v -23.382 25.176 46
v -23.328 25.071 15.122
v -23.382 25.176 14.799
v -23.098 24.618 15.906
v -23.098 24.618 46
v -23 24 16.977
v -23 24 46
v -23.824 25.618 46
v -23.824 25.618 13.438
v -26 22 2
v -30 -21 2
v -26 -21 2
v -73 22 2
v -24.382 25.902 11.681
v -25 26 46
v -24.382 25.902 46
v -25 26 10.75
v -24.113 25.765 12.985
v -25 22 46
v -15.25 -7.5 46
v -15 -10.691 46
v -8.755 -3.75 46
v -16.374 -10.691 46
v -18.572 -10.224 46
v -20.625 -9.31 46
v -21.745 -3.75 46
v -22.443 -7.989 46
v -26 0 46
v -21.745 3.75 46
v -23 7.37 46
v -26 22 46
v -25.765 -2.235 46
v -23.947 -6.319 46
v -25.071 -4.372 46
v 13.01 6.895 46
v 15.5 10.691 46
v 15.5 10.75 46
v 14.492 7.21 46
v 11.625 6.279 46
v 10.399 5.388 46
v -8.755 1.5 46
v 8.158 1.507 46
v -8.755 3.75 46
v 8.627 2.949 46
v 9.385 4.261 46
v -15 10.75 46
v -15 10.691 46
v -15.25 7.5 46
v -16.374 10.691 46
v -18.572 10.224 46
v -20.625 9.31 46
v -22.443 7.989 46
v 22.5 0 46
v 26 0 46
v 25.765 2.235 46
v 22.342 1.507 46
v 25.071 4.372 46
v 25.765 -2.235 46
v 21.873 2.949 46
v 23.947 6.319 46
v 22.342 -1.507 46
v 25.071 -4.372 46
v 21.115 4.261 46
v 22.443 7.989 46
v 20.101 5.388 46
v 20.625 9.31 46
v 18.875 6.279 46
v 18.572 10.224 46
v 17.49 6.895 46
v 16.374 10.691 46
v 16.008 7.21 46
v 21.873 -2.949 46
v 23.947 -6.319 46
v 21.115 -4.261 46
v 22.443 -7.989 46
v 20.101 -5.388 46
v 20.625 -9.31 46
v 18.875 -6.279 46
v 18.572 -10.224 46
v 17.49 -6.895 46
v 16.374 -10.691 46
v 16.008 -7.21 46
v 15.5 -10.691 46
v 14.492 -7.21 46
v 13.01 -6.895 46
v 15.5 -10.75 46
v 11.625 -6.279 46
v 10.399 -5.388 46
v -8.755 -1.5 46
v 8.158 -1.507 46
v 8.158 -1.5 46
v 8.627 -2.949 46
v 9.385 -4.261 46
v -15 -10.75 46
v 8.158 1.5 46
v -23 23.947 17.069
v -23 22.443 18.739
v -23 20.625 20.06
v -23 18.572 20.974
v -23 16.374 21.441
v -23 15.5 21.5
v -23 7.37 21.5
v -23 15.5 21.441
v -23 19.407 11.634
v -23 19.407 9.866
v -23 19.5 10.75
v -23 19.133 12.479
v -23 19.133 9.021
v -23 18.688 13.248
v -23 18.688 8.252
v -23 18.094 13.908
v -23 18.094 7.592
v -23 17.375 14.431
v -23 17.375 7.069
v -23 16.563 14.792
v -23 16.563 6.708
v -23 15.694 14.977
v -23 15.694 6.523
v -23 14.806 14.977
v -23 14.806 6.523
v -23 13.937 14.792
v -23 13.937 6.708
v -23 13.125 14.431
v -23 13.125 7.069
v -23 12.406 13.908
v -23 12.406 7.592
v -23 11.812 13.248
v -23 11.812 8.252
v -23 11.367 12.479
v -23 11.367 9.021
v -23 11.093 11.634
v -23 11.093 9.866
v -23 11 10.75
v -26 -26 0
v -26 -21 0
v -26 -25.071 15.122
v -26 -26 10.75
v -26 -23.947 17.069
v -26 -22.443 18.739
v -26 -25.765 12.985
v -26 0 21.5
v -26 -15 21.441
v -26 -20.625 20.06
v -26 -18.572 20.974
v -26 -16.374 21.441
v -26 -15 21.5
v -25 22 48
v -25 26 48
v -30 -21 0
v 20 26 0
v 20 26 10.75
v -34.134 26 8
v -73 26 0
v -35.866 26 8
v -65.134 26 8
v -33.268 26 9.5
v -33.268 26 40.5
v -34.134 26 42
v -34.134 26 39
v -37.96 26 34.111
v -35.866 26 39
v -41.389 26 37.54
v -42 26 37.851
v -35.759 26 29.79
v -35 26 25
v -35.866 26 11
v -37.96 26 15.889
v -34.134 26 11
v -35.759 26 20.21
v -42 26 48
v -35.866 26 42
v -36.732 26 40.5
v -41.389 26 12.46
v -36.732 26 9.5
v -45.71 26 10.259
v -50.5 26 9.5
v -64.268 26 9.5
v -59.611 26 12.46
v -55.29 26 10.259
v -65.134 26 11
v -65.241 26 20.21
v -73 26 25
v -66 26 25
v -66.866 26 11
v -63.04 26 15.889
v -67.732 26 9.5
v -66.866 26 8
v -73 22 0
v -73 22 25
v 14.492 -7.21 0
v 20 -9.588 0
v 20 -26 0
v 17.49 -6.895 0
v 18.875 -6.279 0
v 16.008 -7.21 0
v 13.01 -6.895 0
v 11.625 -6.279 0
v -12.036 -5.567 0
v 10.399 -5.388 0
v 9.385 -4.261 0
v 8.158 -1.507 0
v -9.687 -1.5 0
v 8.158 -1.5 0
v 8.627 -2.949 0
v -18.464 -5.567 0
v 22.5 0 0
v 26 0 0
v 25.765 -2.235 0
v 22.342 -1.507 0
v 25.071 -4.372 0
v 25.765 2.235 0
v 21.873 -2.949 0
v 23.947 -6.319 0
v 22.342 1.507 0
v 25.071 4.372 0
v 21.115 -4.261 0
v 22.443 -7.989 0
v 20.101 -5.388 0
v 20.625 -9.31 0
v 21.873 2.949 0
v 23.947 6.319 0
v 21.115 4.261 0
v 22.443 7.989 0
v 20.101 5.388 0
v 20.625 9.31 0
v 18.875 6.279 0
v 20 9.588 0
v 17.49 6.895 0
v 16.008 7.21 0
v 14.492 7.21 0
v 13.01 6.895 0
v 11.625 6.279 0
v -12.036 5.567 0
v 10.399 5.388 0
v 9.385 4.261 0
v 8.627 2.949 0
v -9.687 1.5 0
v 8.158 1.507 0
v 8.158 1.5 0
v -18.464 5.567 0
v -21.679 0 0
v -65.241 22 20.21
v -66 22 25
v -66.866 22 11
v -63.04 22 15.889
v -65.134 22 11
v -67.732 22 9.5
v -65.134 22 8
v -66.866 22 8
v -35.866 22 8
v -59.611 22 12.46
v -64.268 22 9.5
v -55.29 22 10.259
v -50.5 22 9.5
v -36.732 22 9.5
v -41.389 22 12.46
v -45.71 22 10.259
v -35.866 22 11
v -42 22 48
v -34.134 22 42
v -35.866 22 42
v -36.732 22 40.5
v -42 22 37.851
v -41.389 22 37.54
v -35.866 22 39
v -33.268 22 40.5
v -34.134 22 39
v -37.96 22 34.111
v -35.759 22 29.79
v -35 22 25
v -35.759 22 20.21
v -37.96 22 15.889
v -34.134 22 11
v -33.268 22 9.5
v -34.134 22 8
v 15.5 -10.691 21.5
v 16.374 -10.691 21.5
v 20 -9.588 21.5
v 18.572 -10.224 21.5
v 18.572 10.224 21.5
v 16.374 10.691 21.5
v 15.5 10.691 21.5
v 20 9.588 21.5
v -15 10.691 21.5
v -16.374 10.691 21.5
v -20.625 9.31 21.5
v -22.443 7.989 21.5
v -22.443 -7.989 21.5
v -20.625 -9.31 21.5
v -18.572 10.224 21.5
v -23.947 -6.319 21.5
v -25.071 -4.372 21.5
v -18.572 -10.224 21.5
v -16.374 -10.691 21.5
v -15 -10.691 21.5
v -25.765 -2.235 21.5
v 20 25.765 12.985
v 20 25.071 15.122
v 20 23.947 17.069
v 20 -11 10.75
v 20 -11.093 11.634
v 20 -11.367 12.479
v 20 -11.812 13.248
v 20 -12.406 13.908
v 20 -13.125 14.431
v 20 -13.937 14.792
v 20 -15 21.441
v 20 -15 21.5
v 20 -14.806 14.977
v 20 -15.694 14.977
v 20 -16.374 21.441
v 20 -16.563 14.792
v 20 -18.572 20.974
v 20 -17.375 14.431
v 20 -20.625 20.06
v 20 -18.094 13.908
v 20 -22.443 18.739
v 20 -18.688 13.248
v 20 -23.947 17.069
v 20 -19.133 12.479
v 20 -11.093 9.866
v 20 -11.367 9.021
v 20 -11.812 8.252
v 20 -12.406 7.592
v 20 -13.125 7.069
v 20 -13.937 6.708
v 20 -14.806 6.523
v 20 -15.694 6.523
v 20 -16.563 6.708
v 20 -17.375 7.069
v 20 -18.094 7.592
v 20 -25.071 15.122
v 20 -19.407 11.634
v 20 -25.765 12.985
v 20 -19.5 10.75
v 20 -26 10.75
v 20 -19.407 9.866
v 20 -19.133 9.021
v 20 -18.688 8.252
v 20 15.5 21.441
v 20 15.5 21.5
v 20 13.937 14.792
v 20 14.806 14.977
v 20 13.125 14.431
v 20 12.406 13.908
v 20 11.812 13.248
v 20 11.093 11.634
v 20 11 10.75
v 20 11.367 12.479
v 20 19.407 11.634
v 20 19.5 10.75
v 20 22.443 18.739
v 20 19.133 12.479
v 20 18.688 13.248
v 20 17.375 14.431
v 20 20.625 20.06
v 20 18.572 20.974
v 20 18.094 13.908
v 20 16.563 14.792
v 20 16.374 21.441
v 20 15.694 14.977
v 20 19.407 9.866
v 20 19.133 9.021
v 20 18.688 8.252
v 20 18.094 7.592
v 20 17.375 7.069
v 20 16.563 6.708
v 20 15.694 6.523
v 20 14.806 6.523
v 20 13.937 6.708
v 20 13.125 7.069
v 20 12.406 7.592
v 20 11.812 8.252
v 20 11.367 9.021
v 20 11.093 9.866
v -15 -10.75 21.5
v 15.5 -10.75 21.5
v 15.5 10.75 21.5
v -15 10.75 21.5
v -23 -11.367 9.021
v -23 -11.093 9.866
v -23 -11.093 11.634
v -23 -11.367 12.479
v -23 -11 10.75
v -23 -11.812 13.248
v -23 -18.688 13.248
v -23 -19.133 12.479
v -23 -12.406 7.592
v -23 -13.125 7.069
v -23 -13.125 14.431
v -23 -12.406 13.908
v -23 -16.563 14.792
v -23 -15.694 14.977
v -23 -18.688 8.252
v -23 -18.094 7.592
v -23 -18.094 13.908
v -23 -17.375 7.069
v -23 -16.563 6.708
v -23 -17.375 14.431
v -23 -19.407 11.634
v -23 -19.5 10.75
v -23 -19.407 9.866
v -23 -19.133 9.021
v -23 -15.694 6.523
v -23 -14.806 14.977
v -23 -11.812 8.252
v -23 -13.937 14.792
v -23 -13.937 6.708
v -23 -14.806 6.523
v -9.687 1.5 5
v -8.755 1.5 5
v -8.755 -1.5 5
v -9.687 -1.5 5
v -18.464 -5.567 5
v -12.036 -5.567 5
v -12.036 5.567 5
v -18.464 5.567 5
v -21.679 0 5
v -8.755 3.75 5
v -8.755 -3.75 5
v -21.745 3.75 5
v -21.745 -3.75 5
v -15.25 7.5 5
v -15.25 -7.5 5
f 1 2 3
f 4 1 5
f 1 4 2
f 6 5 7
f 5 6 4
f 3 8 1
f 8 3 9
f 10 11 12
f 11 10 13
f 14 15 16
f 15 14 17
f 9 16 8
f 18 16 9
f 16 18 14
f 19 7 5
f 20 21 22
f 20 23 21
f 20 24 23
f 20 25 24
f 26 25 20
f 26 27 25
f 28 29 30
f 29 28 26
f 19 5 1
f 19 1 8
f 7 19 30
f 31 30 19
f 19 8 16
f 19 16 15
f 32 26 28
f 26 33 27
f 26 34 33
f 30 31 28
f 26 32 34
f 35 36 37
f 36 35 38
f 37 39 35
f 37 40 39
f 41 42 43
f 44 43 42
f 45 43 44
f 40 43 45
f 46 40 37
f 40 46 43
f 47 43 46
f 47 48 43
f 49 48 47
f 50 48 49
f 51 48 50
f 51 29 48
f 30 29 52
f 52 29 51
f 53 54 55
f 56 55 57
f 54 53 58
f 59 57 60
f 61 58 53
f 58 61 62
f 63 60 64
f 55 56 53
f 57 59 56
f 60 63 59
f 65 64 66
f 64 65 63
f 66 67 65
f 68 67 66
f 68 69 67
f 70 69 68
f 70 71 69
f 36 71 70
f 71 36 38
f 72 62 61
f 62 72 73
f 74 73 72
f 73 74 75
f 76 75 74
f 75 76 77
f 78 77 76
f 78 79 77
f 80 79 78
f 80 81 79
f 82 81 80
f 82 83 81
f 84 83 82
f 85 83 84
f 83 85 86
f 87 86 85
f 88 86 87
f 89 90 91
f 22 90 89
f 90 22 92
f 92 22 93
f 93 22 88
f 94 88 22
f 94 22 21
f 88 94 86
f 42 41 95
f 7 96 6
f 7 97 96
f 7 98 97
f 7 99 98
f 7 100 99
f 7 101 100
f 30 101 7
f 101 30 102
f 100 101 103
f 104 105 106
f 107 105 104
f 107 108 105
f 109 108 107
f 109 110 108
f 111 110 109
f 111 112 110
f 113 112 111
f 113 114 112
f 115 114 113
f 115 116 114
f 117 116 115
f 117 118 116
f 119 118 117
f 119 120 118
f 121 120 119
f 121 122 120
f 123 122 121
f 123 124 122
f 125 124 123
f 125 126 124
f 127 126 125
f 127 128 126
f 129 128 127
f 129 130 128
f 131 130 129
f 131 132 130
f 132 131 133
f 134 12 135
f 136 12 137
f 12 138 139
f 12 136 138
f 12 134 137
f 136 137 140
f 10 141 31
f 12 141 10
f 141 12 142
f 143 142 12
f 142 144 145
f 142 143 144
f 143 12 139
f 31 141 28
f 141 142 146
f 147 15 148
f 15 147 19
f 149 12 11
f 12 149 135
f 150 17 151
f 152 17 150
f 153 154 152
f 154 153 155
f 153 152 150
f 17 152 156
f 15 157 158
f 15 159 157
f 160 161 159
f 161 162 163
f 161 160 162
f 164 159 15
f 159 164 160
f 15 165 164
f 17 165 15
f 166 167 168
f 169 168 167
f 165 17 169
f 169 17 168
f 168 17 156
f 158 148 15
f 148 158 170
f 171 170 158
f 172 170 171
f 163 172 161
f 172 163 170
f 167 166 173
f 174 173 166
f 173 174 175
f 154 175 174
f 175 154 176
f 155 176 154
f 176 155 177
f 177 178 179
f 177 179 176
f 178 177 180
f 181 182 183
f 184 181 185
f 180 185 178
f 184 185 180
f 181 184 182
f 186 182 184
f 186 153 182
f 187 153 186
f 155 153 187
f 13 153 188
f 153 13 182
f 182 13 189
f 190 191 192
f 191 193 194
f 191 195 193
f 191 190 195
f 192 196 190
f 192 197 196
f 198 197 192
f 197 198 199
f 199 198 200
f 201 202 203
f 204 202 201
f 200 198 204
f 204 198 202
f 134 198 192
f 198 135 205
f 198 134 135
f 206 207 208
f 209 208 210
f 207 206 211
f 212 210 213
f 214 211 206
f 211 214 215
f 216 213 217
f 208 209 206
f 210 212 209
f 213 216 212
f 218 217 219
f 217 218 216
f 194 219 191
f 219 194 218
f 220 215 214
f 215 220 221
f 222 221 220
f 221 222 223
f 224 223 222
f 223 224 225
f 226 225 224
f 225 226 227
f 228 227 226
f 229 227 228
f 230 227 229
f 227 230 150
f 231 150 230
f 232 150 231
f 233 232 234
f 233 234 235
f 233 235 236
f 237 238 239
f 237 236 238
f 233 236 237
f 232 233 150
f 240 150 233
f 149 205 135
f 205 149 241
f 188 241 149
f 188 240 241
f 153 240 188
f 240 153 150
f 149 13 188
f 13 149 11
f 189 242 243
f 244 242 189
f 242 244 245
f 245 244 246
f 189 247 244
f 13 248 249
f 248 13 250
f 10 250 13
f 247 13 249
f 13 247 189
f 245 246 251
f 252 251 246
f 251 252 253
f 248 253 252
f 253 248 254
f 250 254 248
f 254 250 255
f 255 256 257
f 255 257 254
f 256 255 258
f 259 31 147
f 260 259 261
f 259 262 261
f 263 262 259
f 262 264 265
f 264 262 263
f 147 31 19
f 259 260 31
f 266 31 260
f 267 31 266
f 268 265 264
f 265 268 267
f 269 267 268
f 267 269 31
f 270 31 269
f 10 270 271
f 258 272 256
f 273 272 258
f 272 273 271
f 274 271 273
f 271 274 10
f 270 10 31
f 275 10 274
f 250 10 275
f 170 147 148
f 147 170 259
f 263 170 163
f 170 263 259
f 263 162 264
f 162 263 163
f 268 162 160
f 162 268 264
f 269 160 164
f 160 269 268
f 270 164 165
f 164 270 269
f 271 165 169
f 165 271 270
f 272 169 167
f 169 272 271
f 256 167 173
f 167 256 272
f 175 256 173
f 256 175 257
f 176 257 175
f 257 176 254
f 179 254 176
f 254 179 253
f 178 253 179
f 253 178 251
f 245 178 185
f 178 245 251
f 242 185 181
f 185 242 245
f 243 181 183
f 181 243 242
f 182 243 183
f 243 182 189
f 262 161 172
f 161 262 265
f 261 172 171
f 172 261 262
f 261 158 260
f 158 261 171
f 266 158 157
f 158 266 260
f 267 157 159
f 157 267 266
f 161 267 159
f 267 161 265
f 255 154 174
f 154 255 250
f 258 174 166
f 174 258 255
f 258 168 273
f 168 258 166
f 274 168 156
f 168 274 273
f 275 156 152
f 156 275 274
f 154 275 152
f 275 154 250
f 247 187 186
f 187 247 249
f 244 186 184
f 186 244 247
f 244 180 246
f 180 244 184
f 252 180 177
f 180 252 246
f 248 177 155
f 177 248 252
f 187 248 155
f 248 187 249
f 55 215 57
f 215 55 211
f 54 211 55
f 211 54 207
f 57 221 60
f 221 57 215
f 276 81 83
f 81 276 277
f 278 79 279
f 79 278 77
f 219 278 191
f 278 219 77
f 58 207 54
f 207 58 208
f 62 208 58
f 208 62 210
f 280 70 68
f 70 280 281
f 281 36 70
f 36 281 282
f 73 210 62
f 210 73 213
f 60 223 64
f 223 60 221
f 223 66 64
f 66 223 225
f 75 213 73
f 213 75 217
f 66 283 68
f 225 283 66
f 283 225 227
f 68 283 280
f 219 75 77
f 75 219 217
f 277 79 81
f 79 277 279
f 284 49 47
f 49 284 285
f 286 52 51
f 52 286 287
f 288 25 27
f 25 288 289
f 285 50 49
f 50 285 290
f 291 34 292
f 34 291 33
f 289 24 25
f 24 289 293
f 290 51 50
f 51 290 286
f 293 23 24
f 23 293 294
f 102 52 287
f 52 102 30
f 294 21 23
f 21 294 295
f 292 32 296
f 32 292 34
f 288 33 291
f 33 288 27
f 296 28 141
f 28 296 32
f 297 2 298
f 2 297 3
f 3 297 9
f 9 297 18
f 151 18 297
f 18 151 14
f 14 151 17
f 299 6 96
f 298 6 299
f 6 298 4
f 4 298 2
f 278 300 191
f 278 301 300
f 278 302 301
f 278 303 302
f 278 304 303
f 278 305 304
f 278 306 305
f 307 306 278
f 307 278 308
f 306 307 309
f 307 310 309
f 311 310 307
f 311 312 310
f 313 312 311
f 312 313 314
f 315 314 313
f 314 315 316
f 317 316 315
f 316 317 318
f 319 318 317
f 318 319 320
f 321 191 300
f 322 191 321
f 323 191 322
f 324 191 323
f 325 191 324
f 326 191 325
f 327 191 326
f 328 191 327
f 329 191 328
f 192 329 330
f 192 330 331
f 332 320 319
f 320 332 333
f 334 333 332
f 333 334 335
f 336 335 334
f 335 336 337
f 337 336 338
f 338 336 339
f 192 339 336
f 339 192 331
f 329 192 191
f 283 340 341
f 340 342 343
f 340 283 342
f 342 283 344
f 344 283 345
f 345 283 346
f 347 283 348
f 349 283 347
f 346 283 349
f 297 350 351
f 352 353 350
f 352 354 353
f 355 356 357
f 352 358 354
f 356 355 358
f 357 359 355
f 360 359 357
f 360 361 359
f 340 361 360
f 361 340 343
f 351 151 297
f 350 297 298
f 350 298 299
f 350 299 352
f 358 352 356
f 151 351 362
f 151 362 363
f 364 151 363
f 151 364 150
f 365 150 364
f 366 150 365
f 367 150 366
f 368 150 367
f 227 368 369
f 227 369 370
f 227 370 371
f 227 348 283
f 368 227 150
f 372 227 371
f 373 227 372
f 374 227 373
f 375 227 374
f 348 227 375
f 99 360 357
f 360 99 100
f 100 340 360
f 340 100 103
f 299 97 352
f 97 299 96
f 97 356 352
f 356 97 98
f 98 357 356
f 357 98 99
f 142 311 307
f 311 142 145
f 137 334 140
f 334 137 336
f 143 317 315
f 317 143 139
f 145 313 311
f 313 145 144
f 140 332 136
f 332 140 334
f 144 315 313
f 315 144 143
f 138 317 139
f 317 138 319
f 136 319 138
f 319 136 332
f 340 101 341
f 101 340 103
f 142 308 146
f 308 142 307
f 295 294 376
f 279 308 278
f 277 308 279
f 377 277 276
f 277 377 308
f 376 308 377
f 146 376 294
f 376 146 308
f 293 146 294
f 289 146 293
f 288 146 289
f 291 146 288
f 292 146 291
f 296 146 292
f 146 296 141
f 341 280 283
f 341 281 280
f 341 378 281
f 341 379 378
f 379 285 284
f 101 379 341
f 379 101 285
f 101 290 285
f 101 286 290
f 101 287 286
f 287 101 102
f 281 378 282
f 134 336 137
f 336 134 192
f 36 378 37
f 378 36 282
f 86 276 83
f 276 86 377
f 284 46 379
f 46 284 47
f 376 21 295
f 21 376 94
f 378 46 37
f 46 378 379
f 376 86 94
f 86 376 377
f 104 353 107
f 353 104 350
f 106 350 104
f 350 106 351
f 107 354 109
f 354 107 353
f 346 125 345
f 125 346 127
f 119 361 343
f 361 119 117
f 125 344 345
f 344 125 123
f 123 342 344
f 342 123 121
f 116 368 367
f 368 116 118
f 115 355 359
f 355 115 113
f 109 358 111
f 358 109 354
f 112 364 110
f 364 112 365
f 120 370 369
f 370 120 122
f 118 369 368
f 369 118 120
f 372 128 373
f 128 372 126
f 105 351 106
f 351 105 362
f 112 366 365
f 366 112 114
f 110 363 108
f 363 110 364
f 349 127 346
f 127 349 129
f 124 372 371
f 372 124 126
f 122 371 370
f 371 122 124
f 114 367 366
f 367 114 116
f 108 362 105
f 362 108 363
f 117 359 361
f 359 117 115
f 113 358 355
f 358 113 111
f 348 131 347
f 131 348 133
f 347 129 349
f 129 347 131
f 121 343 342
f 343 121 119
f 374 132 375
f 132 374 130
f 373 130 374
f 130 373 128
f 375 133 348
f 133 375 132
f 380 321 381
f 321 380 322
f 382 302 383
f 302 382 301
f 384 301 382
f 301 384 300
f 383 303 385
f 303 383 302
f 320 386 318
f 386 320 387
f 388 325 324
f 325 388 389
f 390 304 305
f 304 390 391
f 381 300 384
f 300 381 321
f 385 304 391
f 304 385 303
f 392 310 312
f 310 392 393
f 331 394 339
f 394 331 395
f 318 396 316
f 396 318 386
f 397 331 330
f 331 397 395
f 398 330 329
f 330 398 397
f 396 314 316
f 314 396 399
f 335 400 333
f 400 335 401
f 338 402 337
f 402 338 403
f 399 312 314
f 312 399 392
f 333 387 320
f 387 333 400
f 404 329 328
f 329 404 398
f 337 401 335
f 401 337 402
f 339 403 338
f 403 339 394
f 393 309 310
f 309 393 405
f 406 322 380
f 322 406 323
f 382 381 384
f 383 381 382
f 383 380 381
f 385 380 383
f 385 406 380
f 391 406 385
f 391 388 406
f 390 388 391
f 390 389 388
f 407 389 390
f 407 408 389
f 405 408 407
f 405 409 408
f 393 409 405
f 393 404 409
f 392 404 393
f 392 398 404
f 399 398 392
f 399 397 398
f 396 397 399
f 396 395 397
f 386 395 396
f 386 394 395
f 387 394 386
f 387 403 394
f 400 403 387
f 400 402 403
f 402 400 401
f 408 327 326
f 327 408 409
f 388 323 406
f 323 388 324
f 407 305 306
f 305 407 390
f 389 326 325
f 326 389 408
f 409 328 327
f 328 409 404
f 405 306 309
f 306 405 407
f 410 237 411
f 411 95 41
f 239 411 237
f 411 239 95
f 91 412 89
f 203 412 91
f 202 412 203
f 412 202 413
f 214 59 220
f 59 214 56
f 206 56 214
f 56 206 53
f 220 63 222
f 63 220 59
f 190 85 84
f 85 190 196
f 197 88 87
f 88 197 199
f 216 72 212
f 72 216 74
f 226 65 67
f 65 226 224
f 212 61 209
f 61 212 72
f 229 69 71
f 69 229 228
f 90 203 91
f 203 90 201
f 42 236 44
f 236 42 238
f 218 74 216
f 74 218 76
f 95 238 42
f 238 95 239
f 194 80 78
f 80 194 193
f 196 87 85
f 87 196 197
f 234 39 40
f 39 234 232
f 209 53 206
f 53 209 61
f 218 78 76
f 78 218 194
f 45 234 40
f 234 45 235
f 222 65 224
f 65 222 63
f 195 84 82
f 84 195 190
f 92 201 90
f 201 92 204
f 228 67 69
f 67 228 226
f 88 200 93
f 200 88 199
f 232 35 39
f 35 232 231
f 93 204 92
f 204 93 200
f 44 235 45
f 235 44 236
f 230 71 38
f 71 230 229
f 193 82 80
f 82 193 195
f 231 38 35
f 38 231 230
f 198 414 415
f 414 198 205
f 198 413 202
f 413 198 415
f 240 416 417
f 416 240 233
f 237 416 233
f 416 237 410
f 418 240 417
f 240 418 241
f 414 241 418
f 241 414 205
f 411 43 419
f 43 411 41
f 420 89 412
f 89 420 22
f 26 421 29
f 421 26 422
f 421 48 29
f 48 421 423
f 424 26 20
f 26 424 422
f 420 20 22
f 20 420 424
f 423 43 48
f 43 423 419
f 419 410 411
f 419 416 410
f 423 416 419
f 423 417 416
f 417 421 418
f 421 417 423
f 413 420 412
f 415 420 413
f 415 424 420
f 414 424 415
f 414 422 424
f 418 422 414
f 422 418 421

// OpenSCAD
include <wallace2.scad>;

//x_end2(0);
//translate([-60,0,0]) 
x_end2(1);


module x_end2(motor = 0) mirror([(motor == 0) ? 1 : 0, 0, 0]) difference() {
	union() {
	
		if(motor > 0){
    
      translate([-1-(motor_casing / 2 + rod_size + bearing_size + 8) / 2 - motor_casing, (x_rod_spacing + 8 + rod_size)/2 + 3, 2])
      {

        translate([motor_casing+4/2+1,-4/2,0]){
          cylinder(r=4/2,h=motor_casing-1);

          translate([-4/2+1,4/2-x_rod_spacing+4,0]) cube([4-1,x_rod_spacing-4/2-4,motor_casing-1]);
        }

       rotate([90, 0, 0]) 
        {


          // Motor plate
          translate([0,-2,0]) 
          {
            difference(){
              cube([motor_casing+3,2,(motor_casing / 2 + rod_size + bearing_size + 8)-7]);
              translate([0,-1,4]) rotate([0,-45,0]) cube([motor_casing*2,2+2,40]);
            }
          }
          // Motor holder
          linear_extrude(height = 4) difference() {
            square([motor_casing + 3, x_rod_spacing + 8 + rod_size]);
            translate([motor_casing / 2, (x_rod_spacing + 8 + rod_size) / 2, 0]) {
              circle(motor_screw_spacing / 2);
              for(x = [1, -1]) for(y = [1, -1]) translate([x * motor_screw_spacing / 2, y * motor_screw_spacing / 2, 0]) circle(m3_size * da6, $fn = 6);
              translate([-(motor_casing * 1.5 - motor_screw_spacing), (motor > 1) ? (motor_casing / 2 - motor_screw_spacing) : 0, 0]) square([motor_casing, x_rod_spacing + 8 + rod_size]);
            }
          }
          
          // Belt
          %translate([motor_casing / 2, (x_rod_spacing + 8 + rod_size) / 2, rod_size / 2 - 2 - bearing_size / 2 - 2 - idler_pulley_width / 2]) rotate([180, 0, 0]) linear_extrude(height = 5, convexity = 5) difference() {
            union() {
              circle(pulley_size / 2 + 2);
              translate([0, -pulley_size / 2 - 2, 0]) square([200.5, pulley_size + 4]);
              translate([200.5, 0, 0]) circle(pulley_size / 2 + 2);
            }
            circle(pulley_size / 2);
            translate([0, -pulley_size / 2, 0]) square([200.5, pulley_size]);
            translate([200.5, 0, 0]) circle(pulley_size / 2);
          }

        }
      }
}
		
    difference() {
			union() {
        // cylinders for bearings & Z-rod
				for(side = [1, -1]) translate([side * (motor_casing / 4 + rod_size / 2), 0, 0]) cylinder(r=bearing_size / 2 + 3, $fn = 30,h=x_rod_spacing + 8 + rod_size);
        // connector between these cylinders
				translate([-x_rod_spacing/2,-1*(bearing_size / 2 + 3), 0]) cube([motor_casing / 2 + rod_size,2*(bearing_size / 2 + 3),x_rod_spacing + 8 + rod_size]);
				
        // cylinders for x-rods
				rotate([90,0,90]){
          for(side = [1, -1]) 
          translate([side * (motor_casing / 4 + rod_size / 2), bearing_size / 2 + 3,-1/2*(x_rod_spacing + 8 + rod_size)-3]) 
          cylinder(r=bearing_size / 2 + 3, $fn = 30,h=x_rod_spacing + 8 + rod_size);

        // connector block between cylinders
				translate([-x_rod_spacing/2,0, -1/2*(x_rod_spacing + 8 + rod_size)-3]) cube([motor_casing / 2 + rod_size,2*(bearing_size / 2 + 3),x_rod_spacing + 8 + rod_size]);

        // bottom half cube to make bottom straight
				translate([-x_rod_spacing/2-(bearing_size / 2 + 3)-.25,0, -1/2*(x_rod_spacing + 8 + rod_size)-3]) 
          cube([motor_casing / 2 + rod_size + 2*(bearing_size / 2 + 3),0.5*2*(bearing_size / 2 + 3),x_rod_spacing + 8 + rod_size]);

  
      if(motor == 0)   {
      // idler bolt bearing guide
        rotate([0,90,0]){
          hull(){
            translate([0,0.5*(x_rod_spacing + 8 + rod_size), 0]) {
              cylinder(r=15,h=0.5*(x_rod_spacing + 8 + rod_size)+3,$fn=50); 
              translate([0,-8,0]) cylinder(r=15,h=0.5*(x_rod_spacing + 8 + rod_size)+3,$fn=20); 
            }
          }
        }




        // idler bolt bearing rest
        rotate([0,90,0]){
        hull(){
				translate([0,0.5*(x_rod_spacing + 8 + rod_size), 0.5*(x_rod_spacing + 8 + rod_size) + 3]) 
          cylinder(r=7.6/2+1,h=0.5); 
				translate([0,0.5*(x_rod_spacing + 8 + rod_size)-2, 0.5*(x_rod_spacing + 8 + rod_size) + 3 - 0.5]) 
          cylinder(r=7.6/2+1,h=0.5); 
}
        }

      }

/*
        // z-poker plate
				translate([-x_rod_spacing/2-(bearing_size / 2 + 3)-10,0, 1/2*(x_rod_spacing + 8 + rod_size)-3-20]) 
          cube([motor_casing / 2 + rod_size + 2*(bearing_size / 2 + 3),5,20]);
*/




        }

   

		}

			
			// clamp spacer 
      cube([motor_casing / 2 + rod_size, 3,2+2*(x_rod_spacing + 8 + rod_size)], center = true);

			// bearing hole
      translate([(motor_casing / 4 + rod_size / 2), 0, -1]) cylinder(h=2+x_rod_spacing + 8 + rod_size,r=bearing_size / 2 - .5, $fn = 30);

      // nut hole
			translate([-(motor_casing / 4 + rod_size / 2), 0, -1]) cylinder(h=2+x_rod_spacing + 8 + rod_size,r=rod_nut_size * 6/14, $fn = 6);

      if(motor == 0)   {

        // idler bolt mount - hole
        rotate([90,0,0]){
          translate([0,0.5*(x_rod_spacing + 8 + rod_size), -50]) 
            #cylinder(r=7.6/2,h=50); 
        }
       }
/*
      // z- set screw hole
      for(side = [1,0, -1]) translate([side*6+10,-x_rod_spacing/2-(bearing_size / 2 + 3)-(10/2),-1]) 
      #cylinder(r=3/2-0.05,h=5+2);
*/

      // smooth rod holes
			rotate([90,0,90]){
         for(side = [1, -1]) 
         translate([side * (motor_casing / 4 + rod_size / 2), bearing_size / 2 + 3,-1/2*(x_rod_spacing + 8 + rod_size)]) 
         #cylinder(r=rod_size/2 + 0.25, $fn = 30,h=x_rod_spacing + 8 + rod_size+10);
      }
			
		}


		
	}

  // z-screw hole
  if(motor == 0) translate([rod_size/2+2,0.5*(x_rod_spacing + 8 + rod_size),-1]) cylinder(r=3/2-0.15,h=50);


  // M8 nut cap
	translate([-(motor_casing / 4 + rod_size / 2), 0, 5]) rotate(90) #cylinder(r = rod_nut_size / 2, h = x_rod_spacing + 8 + rod_size, $fn = 6);

  // smooth rod display
	translate([(motor_casing / 4 + rod_size / 2), 0, 5]) %rotate(180 / 8) #cylinder(r = rod_size * da8, h = 200, center = true, $fn = 8);
}
